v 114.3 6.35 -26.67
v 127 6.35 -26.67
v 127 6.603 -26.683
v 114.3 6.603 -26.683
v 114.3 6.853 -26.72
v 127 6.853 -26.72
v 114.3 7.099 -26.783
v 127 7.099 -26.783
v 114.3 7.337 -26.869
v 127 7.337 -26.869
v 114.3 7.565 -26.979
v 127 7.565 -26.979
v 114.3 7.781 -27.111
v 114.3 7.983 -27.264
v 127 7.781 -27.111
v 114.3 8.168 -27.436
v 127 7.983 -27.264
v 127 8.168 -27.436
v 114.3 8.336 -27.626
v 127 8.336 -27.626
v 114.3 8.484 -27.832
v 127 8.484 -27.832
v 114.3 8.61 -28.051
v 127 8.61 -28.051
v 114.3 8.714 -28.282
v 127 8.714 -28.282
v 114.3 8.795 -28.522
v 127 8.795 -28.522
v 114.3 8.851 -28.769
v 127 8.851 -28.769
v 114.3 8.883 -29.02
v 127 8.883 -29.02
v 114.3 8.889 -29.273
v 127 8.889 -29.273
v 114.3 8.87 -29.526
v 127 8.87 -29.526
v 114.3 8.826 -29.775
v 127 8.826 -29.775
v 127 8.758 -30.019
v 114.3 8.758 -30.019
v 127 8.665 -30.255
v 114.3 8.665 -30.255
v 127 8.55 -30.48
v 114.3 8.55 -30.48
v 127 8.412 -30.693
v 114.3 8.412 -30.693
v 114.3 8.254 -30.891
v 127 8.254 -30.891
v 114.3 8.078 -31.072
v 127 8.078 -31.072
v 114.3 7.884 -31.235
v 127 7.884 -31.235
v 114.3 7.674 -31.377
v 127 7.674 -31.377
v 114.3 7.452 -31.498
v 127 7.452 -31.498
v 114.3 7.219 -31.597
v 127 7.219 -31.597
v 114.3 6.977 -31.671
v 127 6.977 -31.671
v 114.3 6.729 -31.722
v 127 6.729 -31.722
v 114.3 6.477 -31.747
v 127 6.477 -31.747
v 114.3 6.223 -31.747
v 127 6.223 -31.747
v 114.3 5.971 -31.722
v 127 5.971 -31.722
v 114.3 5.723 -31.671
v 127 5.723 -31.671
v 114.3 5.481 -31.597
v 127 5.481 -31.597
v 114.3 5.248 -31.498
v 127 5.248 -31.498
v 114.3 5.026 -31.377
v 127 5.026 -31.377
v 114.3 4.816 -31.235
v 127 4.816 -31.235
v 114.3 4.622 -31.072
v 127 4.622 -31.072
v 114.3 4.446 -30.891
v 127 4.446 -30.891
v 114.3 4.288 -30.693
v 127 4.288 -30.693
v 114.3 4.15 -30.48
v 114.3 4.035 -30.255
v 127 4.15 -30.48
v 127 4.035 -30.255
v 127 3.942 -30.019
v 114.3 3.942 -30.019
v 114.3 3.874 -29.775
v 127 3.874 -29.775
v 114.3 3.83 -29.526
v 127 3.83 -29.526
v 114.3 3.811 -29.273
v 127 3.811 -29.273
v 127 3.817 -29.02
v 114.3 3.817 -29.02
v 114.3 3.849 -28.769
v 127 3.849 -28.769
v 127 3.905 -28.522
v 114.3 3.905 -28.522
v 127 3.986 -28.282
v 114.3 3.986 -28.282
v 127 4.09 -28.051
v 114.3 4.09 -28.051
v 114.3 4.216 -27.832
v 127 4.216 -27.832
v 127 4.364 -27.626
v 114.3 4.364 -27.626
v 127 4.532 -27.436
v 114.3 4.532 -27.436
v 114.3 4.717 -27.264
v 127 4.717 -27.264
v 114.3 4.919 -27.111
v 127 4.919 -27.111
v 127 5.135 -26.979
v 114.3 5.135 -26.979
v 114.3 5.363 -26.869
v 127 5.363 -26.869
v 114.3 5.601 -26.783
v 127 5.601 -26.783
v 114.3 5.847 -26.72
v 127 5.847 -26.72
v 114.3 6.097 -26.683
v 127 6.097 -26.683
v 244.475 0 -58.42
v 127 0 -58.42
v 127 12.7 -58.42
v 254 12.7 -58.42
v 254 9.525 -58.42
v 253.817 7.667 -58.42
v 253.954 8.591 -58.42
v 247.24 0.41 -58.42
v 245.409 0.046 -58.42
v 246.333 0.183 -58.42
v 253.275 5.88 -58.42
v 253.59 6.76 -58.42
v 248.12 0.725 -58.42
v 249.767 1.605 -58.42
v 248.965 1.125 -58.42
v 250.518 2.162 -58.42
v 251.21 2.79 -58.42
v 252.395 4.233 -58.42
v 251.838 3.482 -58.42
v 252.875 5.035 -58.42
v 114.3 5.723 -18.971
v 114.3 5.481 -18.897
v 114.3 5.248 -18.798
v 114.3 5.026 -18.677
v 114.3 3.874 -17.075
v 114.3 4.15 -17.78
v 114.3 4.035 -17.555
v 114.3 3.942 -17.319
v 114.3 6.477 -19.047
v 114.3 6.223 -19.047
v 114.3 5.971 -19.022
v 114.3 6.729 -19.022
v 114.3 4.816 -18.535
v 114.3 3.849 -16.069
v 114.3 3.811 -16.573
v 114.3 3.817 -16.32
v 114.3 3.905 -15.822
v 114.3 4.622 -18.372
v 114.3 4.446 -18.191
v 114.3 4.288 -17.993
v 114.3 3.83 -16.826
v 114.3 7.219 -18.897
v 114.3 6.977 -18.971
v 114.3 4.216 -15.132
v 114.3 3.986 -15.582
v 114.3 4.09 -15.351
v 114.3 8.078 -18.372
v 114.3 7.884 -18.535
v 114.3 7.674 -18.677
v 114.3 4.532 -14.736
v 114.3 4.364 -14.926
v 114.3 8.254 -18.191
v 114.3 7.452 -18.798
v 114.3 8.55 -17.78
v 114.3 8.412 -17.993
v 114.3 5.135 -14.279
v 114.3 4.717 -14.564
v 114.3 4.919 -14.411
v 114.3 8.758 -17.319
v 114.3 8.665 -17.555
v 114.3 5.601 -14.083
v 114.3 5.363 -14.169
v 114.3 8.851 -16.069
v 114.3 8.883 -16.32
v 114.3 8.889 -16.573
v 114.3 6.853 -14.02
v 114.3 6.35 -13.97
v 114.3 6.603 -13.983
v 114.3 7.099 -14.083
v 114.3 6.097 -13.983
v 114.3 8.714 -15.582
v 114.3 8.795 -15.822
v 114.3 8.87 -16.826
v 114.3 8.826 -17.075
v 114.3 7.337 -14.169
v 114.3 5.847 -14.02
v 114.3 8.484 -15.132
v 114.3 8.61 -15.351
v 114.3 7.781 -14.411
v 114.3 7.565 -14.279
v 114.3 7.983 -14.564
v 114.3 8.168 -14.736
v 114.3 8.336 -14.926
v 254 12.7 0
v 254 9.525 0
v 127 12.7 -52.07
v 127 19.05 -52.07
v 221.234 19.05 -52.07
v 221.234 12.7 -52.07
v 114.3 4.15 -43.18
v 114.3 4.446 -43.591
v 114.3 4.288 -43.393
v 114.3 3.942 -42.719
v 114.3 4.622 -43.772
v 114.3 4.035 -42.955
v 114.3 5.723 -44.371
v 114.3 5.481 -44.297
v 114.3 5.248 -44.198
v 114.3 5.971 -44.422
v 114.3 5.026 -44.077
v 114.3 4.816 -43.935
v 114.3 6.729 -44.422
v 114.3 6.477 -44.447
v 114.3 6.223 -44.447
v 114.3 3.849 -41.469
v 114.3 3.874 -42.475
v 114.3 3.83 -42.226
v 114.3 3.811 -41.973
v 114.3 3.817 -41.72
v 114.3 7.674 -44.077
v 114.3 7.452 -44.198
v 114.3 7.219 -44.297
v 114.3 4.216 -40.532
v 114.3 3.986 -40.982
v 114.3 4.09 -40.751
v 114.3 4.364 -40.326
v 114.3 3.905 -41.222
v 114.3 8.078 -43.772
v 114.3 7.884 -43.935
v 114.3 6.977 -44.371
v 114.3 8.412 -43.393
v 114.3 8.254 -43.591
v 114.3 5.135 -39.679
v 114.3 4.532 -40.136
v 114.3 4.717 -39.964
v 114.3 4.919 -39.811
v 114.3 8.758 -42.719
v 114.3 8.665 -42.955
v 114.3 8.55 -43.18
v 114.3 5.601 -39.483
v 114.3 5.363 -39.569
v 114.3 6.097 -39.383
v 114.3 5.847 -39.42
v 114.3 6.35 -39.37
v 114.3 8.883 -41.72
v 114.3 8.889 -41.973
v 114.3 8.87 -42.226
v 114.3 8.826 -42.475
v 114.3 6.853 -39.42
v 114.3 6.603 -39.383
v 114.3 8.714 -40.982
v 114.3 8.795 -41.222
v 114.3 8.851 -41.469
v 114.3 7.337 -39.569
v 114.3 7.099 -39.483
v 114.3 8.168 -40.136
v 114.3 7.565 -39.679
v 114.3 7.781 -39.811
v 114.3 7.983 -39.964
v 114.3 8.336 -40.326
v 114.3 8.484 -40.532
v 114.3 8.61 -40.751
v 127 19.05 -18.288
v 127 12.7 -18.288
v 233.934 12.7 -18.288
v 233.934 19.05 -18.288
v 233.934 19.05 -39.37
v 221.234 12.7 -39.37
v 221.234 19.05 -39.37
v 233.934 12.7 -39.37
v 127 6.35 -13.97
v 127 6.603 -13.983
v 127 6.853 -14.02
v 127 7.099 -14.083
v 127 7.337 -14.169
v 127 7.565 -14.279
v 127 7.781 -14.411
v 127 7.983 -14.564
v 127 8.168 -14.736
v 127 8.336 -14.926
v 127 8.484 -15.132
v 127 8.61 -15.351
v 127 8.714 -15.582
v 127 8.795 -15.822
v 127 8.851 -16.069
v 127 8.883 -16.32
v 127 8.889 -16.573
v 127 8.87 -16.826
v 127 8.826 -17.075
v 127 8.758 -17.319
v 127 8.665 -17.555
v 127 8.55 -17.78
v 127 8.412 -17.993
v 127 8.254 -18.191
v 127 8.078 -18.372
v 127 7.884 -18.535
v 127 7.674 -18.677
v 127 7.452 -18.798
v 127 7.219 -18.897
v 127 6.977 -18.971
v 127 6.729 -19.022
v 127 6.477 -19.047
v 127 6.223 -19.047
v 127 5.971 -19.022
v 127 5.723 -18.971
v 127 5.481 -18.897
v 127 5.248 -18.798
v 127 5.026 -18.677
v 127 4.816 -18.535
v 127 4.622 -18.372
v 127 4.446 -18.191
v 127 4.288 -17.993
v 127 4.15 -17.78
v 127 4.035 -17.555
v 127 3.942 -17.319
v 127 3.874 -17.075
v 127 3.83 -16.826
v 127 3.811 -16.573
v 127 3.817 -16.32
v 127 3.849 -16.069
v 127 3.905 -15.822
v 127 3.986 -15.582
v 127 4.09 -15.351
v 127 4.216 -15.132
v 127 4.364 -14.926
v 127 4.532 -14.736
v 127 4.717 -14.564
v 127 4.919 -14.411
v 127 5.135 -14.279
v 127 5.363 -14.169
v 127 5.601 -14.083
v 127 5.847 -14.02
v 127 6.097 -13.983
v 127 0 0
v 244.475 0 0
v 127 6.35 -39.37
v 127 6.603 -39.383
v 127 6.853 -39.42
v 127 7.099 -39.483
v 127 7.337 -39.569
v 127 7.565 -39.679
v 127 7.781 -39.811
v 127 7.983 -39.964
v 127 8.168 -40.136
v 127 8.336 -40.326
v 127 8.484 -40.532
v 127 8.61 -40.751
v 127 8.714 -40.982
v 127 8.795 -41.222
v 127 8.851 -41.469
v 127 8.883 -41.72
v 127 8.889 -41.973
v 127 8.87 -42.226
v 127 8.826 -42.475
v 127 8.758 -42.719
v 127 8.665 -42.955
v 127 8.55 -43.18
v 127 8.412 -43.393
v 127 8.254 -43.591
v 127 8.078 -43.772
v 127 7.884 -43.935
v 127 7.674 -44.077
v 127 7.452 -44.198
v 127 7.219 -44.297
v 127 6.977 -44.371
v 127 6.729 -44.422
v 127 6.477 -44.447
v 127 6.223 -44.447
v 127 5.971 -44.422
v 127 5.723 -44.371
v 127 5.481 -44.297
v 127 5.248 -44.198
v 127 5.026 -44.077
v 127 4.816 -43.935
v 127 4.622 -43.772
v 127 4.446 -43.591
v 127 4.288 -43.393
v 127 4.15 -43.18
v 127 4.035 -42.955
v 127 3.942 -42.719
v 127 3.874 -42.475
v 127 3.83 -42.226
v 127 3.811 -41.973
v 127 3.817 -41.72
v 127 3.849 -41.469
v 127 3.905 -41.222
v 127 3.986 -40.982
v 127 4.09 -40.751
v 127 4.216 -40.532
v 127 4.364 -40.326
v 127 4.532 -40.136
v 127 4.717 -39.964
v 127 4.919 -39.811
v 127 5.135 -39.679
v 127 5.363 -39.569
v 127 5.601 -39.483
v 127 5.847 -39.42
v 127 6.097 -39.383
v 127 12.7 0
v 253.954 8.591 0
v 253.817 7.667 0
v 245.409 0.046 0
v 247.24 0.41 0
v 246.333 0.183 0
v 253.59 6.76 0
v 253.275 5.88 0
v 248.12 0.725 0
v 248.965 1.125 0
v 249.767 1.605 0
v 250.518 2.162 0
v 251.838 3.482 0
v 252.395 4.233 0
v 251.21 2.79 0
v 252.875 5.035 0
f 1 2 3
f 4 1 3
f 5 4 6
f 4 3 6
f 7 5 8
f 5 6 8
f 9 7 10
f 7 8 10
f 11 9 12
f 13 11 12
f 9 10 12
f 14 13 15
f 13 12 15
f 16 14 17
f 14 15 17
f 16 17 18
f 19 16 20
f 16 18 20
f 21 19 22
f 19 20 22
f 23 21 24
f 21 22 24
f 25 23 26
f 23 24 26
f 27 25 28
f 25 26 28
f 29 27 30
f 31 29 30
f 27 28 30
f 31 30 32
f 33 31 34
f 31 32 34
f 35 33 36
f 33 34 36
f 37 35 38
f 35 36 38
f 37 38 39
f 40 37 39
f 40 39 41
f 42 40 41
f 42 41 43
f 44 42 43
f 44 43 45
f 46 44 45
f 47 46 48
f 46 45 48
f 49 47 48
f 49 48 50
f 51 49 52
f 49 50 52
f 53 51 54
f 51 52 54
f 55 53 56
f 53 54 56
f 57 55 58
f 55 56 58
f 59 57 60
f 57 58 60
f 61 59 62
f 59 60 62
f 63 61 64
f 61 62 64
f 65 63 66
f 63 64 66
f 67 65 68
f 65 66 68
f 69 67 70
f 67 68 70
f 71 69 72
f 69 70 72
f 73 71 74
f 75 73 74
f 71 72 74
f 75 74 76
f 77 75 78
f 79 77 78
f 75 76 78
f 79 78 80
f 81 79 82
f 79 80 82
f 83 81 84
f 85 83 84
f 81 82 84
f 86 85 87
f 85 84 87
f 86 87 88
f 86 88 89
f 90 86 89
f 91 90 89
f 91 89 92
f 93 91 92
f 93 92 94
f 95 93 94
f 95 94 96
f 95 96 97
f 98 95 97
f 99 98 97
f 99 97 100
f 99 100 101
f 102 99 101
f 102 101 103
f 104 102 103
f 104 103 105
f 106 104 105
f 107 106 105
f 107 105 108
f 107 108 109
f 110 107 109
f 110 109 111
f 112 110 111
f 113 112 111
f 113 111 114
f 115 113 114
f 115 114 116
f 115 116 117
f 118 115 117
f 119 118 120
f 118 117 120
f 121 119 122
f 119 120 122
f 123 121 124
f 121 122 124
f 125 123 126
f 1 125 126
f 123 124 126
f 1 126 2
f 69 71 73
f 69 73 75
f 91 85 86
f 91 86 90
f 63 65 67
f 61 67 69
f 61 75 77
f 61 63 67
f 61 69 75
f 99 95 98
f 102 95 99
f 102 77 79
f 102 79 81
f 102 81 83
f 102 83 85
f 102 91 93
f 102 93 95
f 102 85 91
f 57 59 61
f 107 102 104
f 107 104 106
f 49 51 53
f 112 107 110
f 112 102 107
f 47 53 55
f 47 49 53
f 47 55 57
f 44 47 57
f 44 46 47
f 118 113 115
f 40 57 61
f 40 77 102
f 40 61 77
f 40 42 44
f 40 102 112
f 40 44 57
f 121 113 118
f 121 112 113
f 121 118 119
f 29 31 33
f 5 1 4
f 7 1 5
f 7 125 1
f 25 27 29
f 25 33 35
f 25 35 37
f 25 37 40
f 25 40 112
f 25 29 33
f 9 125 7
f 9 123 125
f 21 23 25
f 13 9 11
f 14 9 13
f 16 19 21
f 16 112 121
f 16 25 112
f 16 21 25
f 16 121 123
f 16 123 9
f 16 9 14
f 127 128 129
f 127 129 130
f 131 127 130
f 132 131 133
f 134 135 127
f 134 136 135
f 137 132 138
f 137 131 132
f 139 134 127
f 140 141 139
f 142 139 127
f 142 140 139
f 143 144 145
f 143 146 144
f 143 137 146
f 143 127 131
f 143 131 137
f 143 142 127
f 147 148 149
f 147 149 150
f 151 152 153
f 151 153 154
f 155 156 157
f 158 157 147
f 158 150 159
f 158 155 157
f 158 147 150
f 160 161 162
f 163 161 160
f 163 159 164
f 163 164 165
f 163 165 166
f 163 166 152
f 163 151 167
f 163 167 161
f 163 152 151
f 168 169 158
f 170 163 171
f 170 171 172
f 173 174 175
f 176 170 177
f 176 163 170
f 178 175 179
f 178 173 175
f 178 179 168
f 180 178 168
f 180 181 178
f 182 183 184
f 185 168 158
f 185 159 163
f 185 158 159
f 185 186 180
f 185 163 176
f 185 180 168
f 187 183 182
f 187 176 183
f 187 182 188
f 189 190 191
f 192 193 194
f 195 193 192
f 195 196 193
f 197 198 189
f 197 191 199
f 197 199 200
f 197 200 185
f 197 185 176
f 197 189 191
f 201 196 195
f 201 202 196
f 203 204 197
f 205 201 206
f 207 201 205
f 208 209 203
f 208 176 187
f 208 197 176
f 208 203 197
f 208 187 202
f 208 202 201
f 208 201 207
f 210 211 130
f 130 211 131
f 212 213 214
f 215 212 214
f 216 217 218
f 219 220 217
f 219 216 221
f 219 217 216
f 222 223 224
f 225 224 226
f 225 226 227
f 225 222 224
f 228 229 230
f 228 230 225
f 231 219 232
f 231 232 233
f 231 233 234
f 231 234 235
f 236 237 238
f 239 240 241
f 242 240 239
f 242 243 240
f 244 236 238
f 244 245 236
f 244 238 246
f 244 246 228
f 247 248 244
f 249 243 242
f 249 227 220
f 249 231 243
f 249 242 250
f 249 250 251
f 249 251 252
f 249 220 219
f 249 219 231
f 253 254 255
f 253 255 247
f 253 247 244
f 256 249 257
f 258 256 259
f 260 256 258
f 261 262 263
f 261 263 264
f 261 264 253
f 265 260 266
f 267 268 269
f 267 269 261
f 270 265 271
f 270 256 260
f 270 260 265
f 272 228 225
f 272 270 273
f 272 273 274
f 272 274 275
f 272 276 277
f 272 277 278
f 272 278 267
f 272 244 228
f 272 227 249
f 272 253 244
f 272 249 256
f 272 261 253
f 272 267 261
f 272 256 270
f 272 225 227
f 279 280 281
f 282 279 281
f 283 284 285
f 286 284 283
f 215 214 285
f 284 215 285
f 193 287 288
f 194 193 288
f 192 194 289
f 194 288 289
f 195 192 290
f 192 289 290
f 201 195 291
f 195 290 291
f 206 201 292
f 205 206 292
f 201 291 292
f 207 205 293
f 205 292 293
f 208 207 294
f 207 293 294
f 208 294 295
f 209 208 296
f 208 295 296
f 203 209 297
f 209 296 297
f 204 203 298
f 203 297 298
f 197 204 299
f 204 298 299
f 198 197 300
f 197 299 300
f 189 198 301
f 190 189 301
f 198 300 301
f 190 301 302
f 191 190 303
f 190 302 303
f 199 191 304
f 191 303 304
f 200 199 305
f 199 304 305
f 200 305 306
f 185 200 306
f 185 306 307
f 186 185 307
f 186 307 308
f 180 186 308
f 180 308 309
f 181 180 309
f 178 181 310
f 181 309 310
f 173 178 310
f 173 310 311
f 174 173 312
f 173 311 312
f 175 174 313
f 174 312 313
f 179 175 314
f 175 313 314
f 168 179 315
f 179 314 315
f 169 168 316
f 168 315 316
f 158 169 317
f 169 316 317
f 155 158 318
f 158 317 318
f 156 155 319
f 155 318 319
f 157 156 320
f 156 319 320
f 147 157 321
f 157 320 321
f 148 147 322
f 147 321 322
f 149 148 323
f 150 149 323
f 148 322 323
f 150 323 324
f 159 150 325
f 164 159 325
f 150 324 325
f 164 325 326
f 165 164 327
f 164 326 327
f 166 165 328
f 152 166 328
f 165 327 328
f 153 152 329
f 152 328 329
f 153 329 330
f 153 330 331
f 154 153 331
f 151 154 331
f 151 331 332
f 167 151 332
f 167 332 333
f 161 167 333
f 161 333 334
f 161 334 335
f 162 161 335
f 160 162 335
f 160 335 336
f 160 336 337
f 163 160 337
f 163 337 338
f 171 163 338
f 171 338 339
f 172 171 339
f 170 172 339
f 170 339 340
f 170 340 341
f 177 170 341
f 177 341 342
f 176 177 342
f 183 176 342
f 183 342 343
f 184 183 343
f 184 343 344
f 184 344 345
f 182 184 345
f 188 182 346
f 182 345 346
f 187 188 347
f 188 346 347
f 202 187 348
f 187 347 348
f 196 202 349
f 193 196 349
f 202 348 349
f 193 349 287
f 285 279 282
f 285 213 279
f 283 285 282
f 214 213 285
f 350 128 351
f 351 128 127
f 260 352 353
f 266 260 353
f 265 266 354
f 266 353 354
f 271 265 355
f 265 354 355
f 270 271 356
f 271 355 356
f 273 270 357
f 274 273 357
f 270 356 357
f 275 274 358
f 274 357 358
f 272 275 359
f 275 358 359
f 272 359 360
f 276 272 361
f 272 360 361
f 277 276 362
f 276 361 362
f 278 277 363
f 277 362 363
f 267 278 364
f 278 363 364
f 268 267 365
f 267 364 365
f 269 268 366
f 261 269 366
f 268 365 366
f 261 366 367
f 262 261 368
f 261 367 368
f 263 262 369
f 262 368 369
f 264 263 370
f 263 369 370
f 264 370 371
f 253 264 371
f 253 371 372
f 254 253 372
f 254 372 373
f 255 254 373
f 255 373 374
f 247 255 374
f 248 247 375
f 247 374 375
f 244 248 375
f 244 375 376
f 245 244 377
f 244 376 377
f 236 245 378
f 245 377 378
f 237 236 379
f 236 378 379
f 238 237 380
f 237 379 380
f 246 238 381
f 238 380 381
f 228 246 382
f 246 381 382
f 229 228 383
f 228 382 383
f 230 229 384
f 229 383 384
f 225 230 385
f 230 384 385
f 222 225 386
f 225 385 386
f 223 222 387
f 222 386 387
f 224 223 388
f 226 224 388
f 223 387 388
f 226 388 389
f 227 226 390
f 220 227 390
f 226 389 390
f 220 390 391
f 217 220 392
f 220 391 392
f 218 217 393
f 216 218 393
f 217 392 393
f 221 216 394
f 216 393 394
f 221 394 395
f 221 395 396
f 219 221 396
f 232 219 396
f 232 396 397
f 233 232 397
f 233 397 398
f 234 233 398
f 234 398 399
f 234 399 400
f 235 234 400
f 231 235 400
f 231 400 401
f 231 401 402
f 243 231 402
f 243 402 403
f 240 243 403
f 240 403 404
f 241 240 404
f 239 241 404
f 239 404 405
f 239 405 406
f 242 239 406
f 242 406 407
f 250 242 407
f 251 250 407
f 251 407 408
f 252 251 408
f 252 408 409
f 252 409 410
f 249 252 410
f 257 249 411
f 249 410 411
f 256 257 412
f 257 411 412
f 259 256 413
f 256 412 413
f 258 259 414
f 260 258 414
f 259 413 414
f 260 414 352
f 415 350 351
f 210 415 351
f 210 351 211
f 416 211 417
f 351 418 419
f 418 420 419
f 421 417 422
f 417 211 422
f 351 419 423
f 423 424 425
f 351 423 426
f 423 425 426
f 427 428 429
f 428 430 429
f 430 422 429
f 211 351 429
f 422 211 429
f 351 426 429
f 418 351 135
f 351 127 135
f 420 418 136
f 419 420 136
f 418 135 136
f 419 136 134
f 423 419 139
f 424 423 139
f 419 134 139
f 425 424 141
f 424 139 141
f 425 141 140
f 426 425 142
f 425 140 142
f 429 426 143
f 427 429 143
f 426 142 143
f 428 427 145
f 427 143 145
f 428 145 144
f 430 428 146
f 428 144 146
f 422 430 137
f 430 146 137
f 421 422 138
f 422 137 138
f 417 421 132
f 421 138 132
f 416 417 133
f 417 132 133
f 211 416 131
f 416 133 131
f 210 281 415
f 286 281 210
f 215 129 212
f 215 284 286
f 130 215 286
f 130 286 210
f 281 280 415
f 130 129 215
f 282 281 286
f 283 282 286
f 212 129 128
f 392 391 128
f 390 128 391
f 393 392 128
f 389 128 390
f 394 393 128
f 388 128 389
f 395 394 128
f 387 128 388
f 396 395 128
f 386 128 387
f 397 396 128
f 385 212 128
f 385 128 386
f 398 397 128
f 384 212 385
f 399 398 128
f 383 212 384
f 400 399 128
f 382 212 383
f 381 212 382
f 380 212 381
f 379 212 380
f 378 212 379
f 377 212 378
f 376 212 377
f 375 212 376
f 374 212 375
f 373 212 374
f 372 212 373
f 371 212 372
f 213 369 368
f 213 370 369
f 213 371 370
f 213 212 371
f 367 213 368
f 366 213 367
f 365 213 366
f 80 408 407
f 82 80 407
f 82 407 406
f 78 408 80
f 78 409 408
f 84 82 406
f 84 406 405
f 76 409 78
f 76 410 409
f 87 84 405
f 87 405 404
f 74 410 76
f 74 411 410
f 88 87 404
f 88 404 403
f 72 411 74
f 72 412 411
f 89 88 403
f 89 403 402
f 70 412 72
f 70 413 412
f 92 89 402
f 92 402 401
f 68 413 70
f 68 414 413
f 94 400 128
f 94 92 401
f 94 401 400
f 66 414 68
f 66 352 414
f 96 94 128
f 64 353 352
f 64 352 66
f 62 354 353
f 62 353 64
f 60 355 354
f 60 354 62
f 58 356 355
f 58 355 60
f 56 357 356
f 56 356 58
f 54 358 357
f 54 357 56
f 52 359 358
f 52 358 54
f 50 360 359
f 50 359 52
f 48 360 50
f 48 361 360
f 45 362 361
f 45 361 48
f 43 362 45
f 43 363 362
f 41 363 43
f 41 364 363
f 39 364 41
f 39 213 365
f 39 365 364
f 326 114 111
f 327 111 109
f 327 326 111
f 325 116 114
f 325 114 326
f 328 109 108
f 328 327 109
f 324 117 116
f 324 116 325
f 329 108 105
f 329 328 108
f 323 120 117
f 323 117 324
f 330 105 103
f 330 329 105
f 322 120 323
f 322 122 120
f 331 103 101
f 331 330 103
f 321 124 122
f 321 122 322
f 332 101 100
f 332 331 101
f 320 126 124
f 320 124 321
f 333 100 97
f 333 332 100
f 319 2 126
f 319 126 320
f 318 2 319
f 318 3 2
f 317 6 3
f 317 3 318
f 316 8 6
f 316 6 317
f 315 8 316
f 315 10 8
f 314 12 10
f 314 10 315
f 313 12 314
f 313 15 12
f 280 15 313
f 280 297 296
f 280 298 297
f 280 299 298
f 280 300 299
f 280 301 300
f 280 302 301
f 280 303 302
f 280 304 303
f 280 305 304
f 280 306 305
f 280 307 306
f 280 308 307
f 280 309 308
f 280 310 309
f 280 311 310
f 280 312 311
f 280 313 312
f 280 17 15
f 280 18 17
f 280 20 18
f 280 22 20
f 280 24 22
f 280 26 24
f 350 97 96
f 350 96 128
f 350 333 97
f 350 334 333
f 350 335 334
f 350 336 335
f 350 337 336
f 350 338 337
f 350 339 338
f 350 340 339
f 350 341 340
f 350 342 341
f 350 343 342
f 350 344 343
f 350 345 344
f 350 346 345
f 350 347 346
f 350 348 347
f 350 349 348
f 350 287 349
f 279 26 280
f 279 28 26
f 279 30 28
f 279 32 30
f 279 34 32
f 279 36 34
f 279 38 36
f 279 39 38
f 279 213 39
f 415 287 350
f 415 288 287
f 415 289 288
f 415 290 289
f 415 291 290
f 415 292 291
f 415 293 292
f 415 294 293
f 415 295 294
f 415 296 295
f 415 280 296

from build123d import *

# Parameters (mm, degrees)
SKETCH1_W           = 254
SKETCH1_H           = 58.42
BOSS_EXTRUDE1_DEPTH = 19.05
CUT_EXTRUDE1_DEPTH  = 6.35
FILLET1_R           = 9.525
CUT_EXTRUDE2_START  = -127
SKETCH3_W           = 65.063506332
SKETCH3_H           = 25.722431086
CUT_EXTRUDE2_DEPTH  = 127
SKETCH4_R           = 2.54
BOSS_EXTRUDE2_DEPTH = 12.7
SKETCH5_W           = 12.7
SKETCH5_H           = 21.082
BOSS_EXTRUDE3_DEPTH = 6.35


with BuildPart() as part:
    # Sketch1 → Boss-Extrude1 (new body)
    with BuildSketch(Plane(origin=(0, 0, 0), x_dir=(1, 0, 0), z_dir=(0, 1, 0))):
        with Locations((127, 29.21)):
            Rectangle(SKETCH1_W, SKETCH1_H)
    extrude(amount=BOSS_EXTRUDE1_DEPTH)

    # Sketch2 → Cut-Extrude1 (cut)
    with BuildSketch(Plane(origin=(0, 19.05, 0), x_dir=(1, 0, 0), z_dir=(0, 1, 0))):
        Polygon((221.234, 52.07), (221.234, 18.288), (127, 18.288), (127, 0), (254, 0), (254, 58.42), (127, 58.42), (127, 52.07), align=None)
        Polygon((127, 0), (127, 18.288), (32.766, 18.288), (32.766, 52.07), (127, 52.07), (127, 58.42), (0, 58.42), (0, 0), align=None)
    extrude(amount=-CUT_EXTRUDE1_DEPTH, mode=Mode.SUBTRACT)

    # Fillet1
    fillet1_edges = [part.edges().sort_by_distance(p)[0] for p in [
        (254, 0, -29.21),
        (0, 0, -29.21),
    ]]
    fillet(fillet1_edges, radius=FILLET1_R)

    # Sketch3 → Cut-Extrude2 (cut)
    with BuildSketch(Plane.ZY.offset(CUT_EXTRUDE2_START)):
        with Locations((-32.531753166, 12.861215543)):
            Rectangle(SKETCH3_W, SKETCH3_H)
    extrude(amount=CUT_EXTRUDE2_DEPTH, mode=Mode.SUBTRACT)

    # Sketch4 → Boss-Extrude2 (add)
    with BuildSketch(Plane.ZY.offset(-127)):
        with Locations((-16.51, 6.35)):
            Circle(SKETCH4_R)
        with Locations((-29.21, 6.35)):
            Circle(SKETCH4_R)
        with Locations((-41.91, 6.35)):
            Circle(SKETCH4_R)
    extrude(amount=BOSS_EXTRUDE2_DEPTH)

    # Sketch5 → Boss-Extrude3 (add)
    with BuildSketch(Plane(origin=(0, 12.7, 0), x_dir=(1, 0, 0), z_dir=(0, 1, 0))):
        with Locations((227.584, 28.829)):
            Rectangle(SKETCH5_W, SKETCH5_H)
    extrude(amount=BOSS_EXTRUDE3_DEPTH)


solid = part.part
